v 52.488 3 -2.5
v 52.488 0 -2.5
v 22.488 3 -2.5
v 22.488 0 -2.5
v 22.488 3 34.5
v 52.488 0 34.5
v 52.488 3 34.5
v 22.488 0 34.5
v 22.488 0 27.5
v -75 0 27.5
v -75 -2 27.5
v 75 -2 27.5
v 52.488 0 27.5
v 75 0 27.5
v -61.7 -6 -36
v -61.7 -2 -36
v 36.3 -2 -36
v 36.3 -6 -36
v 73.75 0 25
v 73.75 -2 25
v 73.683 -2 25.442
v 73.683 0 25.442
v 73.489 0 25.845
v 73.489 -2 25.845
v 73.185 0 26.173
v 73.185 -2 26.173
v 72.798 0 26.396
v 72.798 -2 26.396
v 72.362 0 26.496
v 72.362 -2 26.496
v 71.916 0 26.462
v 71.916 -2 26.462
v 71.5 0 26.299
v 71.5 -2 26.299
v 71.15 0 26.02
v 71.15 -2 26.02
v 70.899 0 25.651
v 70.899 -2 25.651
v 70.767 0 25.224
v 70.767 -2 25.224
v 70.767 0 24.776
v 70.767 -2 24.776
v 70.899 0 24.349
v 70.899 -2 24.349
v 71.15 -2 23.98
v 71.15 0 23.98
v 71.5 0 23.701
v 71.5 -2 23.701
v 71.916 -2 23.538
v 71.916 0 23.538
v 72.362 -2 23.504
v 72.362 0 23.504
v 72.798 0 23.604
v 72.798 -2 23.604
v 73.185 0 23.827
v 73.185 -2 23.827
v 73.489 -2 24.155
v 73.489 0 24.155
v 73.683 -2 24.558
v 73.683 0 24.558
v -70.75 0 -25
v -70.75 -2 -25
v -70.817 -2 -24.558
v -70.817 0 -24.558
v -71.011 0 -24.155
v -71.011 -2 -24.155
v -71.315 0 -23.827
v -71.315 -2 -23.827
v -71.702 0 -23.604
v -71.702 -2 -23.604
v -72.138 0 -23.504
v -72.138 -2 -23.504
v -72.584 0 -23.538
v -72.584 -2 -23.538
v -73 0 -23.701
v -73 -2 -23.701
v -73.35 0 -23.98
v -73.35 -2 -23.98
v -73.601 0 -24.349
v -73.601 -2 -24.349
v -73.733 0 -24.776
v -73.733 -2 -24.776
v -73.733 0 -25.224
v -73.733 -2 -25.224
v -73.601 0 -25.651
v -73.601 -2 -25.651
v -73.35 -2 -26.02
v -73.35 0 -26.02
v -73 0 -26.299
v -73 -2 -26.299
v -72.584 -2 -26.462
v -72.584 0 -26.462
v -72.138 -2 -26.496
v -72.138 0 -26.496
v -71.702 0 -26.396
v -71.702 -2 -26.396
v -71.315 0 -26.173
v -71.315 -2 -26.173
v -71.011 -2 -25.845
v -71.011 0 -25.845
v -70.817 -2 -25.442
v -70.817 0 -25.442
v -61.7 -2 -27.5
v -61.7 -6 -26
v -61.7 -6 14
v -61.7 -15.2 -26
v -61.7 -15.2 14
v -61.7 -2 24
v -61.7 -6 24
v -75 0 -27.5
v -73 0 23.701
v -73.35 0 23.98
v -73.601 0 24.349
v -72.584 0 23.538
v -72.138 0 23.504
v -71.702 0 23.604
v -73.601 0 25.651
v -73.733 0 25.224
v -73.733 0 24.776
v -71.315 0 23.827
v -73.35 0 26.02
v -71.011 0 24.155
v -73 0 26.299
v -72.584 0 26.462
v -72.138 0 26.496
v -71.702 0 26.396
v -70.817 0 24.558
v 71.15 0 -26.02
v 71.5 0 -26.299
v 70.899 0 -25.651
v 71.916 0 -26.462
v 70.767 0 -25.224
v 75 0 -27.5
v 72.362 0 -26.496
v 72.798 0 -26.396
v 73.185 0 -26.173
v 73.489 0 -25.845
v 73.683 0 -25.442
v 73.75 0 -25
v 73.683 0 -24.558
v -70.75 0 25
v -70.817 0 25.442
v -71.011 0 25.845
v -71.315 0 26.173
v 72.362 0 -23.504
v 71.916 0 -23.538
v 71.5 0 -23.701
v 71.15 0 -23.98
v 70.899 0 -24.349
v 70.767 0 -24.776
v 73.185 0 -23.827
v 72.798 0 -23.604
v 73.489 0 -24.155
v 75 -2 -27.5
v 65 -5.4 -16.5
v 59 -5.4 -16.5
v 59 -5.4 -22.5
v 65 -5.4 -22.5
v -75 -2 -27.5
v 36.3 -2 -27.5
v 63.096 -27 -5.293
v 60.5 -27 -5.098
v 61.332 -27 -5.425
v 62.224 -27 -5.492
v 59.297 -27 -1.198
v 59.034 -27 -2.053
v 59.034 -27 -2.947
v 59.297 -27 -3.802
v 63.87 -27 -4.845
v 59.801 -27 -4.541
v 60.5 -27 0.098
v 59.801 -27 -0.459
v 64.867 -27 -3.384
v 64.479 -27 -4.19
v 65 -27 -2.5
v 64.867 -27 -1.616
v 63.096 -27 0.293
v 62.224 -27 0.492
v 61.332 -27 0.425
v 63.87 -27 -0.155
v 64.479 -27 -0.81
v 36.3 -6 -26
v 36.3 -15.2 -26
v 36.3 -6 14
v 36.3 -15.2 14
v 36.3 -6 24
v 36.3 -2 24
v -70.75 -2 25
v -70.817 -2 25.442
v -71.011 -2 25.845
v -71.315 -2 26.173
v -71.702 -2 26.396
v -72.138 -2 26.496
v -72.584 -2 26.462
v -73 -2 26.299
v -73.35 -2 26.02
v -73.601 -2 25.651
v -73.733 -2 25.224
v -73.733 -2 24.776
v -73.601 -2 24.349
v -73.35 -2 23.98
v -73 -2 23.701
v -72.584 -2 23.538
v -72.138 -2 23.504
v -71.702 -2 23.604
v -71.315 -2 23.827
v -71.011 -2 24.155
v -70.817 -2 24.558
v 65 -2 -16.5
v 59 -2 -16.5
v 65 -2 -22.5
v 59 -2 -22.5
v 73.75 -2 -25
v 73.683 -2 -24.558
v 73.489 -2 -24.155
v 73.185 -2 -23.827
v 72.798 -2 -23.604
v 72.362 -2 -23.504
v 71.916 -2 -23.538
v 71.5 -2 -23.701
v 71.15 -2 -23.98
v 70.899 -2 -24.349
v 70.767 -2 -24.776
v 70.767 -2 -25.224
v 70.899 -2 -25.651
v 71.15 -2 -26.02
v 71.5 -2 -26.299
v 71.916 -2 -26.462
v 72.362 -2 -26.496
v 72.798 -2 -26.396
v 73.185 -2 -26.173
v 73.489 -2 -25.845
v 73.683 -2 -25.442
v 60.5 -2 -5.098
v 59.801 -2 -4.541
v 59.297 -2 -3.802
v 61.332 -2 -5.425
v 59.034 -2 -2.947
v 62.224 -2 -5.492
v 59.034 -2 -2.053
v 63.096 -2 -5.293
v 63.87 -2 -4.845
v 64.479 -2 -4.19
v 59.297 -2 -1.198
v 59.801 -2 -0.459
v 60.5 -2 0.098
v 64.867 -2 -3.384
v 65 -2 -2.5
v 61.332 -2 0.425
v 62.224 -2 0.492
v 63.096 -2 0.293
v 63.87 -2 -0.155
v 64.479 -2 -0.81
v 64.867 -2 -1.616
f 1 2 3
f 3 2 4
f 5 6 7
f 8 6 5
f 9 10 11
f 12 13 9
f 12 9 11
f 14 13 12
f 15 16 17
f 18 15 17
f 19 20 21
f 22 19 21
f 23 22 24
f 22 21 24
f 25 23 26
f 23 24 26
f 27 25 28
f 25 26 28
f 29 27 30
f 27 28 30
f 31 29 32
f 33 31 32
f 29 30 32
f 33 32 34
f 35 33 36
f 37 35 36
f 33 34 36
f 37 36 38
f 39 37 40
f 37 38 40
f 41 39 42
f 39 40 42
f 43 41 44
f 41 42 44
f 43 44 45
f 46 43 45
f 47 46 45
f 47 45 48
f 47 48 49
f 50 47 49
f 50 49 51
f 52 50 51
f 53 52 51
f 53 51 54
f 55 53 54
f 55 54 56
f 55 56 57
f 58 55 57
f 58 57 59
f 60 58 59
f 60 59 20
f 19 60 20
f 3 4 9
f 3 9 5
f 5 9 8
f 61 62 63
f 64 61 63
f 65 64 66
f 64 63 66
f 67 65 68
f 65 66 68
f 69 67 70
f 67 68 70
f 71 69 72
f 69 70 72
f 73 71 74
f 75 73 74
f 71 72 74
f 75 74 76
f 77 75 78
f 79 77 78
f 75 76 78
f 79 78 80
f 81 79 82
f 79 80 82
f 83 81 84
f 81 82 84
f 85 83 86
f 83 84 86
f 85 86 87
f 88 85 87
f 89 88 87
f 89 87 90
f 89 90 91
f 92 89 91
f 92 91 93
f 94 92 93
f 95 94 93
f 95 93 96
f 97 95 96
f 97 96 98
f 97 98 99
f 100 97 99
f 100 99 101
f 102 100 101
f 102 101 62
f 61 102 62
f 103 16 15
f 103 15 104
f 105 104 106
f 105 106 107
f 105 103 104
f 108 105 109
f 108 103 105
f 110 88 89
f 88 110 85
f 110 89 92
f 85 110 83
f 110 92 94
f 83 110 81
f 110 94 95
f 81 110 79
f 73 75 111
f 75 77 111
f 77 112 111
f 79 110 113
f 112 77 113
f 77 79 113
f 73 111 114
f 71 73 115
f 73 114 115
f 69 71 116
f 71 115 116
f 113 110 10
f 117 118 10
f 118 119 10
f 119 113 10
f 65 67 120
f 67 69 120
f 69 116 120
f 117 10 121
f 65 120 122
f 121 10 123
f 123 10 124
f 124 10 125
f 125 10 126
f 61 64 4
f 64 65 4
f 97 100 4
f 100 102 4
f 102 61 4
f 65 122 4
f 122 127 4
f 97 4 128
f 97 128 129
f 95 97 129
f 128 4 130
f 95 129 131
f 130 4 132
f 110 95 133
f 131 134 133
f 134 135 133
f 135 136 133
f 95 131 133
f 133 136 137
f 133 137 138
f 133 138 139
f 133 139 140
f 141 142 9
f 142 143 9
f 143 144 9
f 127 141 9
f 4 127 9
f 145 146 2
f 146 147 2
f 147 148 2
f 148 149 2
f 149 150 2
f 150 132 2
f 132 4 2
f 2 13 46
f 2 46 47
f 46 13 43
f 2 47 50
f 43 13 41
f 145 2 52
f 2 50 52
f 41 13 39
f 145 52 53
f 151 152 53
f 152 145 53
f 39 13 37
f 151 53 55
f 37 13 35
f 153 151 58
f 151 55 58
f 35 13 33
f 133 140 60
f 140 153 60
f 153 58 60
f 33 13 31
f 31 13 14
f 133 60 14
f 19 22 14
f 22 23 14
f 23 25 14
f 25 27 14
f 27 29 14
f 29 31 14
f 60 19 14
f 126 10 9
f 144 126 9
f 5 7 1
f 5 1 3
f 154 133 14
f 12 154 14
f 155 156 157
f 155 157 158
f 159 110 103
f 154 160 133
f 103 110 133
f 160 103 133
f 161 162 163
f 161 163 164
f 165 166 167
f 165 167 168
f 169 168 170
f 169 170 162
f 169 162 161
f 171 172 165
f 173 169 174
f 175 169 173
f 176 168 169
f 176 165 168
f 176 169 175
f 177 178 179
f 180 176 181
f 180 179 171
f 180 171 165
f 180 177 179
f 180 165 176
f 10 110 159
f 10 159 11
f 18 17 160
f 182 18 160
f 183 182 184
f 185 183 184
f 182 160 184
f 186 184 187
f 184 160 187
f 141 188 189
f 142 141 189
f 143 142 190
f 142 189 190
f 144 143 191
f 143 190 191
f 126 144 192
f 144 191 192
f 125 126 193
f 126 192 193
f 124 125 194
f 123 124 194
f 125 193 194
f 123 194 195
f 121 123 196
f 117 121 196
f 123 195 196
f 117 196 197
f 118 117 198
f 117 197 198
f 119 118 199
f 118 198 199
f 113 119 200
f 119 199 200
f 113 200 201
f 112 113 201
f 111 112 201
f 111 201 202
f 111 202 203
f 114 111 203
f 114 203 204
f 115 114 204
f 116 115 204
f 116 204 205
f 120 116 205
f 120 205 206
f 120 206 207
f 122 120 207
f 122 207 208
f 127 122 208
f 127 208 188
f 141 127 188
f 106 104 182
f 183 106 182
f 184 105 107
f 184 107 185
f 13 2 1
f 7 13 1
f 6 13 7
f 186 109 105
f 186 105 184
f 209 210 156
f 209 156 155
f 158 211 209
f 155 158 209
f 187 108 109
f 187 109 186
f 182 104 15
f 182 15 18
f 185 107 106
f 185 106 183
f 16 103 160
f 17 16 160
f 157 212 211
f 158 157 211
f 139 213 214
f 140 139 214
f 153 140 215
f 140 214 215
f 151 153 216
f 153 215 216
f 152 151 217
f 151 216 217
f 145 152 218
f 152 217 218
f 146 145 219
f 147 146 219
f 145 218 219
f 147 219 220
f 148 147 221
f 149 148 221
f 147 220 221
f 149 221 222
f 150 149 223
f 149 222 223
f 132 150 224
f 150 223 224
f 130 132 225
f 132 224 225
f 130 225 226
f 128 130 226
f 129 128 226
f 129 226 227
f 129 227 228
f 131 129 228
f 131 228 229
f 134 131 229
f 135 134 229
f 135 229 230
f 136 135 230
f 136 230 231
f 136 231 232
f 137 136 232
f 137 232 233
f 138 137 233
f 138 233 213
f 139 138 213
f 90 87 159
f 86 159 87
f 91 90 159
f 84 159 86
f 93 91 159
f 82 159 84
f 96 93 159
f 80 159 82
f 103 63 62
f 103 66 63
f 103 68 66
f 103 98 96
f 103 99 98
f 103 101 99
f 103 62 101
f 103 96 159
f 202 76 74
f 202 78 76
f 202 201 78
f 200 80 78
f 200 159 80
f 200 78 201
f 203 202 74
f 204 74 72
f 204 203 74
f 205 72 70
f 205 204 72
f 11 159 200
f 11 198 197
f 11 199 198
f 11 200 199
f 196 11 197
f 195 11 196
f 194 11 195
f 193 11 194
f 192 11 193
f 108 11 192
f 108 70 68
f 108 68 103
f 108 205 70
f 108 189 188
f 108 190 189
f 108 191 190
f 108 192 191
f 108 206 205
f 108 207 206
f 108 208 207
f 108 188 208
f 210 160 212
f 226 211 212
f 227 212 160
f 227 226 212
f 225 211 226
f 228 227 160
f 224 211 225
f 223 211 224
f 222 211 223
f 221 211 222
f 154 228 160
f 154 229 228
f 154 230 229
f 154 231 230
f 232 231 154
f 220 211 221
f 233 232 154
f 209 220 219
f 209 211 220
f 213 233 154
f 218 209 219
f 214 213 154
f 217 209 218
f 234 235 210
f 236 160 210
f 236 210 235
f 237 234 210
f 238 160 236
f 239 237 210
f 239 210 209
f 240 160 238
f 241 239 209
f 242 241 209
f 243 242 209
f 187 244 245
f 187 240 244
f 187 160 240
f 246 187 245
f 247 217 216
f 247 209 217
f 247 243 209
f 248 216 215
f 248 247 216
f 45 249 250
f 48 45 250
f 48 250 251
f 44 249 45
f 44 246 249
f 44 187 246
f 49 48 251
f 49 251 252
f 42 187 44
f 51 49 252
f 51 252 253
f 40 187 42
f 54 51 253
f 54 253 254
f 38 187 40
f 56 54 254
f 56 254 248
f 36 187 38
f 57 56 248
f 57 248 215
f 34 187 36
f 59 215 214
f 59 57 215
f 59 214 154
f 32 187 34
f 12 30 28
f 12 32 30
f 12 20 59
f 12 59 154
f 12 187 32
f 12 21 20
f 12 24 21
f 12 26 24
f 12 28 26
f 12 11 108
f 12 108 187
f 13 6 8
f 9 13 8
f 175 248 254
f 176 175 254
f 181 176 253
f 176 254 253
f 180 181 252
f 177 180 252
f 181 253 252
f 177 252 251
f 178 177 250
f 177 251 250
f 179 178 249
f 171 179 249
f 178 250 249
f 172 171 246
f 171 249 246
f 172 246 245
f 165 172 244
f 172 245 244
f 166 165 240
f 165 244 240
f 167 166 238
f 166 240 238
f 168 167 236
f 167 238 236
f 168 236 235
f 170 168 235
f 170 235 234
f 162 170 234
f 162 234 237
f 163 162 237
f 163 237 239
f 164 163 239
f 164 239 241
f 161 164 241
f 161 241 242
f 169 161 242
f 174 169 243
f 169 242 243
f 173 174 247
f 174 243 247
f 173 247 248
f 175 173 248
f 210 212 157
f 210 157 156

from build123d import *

# Parameters (mm, degrees)
F0_W      = 150
F0_H      = 55
F1_DEPTH  = 2
F2_R      = 1.5
F3_DEPTH  = 2.001
F4_R      = 3
F5_DEPTH  = 25
F6_W      = 6
F6_H      = 6
F7_DEPTH  = 3.4
F8_W      = 98
F8_H      = 60
F9_DEPTH  = 4
F10_W     = 98
F10_H     = 40
F11_DEPTH = 9.2
F12_W     = 30
F12_H     = 37
F13_DEPTH = 3


with BuildPart() as f1:
    # F0 (on Front) → F1 (new body)
    with BuildSketch(Plane.XZ):
        Rectangle(F0_W, F0_H)
    extrude(amount=F1_DEPTH)

    # F2 (on face) → F3 (cut, through all)
    with BuildSketch(Plane.XZ.offset(2)):
        with Locations((-72.25, 25)):
            Circle(F2_R)
        with Locations((-72.25, -25)):
            Circle(F2_R)
        with Locations((72.25, 25)):
            Circle(F2_R)
        with Locations((72.25, -25)):
            Circle(F2_R)
    extrude(amount=-F3_DEPTH, mode=Mode.SUBTRACT)

    # F4 (on face) → F5 (join)
    with BuildSketch(Plane.XZ.offset(2)):
        with Locations((62, -2.5)):
            Circle(F4_R)
    extrude(amount=F5_DEPTH)

    # F6 (on face) → F7 (join)
    with BuildSketch(Plane.XZ.offset(2)):
        with Locations((62, -19.5)):
            Rectangle(F6_W, F6_H)
    extrude(amount=F7_DEPTH)

    # F8 (on face) → F9 (join)
    with BuildSketch(Plane.XZ.offset(2)):
        with Locations((-12.7, -6)):
            Rectangle(F8_W, F8_H)
    extrude(amount=F9_DEPTH)

    # F10 (on face) → F11 (join)
    with BuildSketch(Plane.XZ.offset(6)):
        with Locations((-12.7, -6)):
            Rectangle(F10_W, F10_H)
    extrude(amount=F11_DEPTH)

    # F12 (on face) → F13 (join)
    with BuildSketch(Plane(origin=(0, 0, 0), x_dir=(-1, 0, 0), z_dir=(0, 1, 0))):
        with Locations((-37.488226, 16)):
            Rectangle(F12_W, F12_H)
    extrude(amount=F13_DEPTH)


solid = f1.part
